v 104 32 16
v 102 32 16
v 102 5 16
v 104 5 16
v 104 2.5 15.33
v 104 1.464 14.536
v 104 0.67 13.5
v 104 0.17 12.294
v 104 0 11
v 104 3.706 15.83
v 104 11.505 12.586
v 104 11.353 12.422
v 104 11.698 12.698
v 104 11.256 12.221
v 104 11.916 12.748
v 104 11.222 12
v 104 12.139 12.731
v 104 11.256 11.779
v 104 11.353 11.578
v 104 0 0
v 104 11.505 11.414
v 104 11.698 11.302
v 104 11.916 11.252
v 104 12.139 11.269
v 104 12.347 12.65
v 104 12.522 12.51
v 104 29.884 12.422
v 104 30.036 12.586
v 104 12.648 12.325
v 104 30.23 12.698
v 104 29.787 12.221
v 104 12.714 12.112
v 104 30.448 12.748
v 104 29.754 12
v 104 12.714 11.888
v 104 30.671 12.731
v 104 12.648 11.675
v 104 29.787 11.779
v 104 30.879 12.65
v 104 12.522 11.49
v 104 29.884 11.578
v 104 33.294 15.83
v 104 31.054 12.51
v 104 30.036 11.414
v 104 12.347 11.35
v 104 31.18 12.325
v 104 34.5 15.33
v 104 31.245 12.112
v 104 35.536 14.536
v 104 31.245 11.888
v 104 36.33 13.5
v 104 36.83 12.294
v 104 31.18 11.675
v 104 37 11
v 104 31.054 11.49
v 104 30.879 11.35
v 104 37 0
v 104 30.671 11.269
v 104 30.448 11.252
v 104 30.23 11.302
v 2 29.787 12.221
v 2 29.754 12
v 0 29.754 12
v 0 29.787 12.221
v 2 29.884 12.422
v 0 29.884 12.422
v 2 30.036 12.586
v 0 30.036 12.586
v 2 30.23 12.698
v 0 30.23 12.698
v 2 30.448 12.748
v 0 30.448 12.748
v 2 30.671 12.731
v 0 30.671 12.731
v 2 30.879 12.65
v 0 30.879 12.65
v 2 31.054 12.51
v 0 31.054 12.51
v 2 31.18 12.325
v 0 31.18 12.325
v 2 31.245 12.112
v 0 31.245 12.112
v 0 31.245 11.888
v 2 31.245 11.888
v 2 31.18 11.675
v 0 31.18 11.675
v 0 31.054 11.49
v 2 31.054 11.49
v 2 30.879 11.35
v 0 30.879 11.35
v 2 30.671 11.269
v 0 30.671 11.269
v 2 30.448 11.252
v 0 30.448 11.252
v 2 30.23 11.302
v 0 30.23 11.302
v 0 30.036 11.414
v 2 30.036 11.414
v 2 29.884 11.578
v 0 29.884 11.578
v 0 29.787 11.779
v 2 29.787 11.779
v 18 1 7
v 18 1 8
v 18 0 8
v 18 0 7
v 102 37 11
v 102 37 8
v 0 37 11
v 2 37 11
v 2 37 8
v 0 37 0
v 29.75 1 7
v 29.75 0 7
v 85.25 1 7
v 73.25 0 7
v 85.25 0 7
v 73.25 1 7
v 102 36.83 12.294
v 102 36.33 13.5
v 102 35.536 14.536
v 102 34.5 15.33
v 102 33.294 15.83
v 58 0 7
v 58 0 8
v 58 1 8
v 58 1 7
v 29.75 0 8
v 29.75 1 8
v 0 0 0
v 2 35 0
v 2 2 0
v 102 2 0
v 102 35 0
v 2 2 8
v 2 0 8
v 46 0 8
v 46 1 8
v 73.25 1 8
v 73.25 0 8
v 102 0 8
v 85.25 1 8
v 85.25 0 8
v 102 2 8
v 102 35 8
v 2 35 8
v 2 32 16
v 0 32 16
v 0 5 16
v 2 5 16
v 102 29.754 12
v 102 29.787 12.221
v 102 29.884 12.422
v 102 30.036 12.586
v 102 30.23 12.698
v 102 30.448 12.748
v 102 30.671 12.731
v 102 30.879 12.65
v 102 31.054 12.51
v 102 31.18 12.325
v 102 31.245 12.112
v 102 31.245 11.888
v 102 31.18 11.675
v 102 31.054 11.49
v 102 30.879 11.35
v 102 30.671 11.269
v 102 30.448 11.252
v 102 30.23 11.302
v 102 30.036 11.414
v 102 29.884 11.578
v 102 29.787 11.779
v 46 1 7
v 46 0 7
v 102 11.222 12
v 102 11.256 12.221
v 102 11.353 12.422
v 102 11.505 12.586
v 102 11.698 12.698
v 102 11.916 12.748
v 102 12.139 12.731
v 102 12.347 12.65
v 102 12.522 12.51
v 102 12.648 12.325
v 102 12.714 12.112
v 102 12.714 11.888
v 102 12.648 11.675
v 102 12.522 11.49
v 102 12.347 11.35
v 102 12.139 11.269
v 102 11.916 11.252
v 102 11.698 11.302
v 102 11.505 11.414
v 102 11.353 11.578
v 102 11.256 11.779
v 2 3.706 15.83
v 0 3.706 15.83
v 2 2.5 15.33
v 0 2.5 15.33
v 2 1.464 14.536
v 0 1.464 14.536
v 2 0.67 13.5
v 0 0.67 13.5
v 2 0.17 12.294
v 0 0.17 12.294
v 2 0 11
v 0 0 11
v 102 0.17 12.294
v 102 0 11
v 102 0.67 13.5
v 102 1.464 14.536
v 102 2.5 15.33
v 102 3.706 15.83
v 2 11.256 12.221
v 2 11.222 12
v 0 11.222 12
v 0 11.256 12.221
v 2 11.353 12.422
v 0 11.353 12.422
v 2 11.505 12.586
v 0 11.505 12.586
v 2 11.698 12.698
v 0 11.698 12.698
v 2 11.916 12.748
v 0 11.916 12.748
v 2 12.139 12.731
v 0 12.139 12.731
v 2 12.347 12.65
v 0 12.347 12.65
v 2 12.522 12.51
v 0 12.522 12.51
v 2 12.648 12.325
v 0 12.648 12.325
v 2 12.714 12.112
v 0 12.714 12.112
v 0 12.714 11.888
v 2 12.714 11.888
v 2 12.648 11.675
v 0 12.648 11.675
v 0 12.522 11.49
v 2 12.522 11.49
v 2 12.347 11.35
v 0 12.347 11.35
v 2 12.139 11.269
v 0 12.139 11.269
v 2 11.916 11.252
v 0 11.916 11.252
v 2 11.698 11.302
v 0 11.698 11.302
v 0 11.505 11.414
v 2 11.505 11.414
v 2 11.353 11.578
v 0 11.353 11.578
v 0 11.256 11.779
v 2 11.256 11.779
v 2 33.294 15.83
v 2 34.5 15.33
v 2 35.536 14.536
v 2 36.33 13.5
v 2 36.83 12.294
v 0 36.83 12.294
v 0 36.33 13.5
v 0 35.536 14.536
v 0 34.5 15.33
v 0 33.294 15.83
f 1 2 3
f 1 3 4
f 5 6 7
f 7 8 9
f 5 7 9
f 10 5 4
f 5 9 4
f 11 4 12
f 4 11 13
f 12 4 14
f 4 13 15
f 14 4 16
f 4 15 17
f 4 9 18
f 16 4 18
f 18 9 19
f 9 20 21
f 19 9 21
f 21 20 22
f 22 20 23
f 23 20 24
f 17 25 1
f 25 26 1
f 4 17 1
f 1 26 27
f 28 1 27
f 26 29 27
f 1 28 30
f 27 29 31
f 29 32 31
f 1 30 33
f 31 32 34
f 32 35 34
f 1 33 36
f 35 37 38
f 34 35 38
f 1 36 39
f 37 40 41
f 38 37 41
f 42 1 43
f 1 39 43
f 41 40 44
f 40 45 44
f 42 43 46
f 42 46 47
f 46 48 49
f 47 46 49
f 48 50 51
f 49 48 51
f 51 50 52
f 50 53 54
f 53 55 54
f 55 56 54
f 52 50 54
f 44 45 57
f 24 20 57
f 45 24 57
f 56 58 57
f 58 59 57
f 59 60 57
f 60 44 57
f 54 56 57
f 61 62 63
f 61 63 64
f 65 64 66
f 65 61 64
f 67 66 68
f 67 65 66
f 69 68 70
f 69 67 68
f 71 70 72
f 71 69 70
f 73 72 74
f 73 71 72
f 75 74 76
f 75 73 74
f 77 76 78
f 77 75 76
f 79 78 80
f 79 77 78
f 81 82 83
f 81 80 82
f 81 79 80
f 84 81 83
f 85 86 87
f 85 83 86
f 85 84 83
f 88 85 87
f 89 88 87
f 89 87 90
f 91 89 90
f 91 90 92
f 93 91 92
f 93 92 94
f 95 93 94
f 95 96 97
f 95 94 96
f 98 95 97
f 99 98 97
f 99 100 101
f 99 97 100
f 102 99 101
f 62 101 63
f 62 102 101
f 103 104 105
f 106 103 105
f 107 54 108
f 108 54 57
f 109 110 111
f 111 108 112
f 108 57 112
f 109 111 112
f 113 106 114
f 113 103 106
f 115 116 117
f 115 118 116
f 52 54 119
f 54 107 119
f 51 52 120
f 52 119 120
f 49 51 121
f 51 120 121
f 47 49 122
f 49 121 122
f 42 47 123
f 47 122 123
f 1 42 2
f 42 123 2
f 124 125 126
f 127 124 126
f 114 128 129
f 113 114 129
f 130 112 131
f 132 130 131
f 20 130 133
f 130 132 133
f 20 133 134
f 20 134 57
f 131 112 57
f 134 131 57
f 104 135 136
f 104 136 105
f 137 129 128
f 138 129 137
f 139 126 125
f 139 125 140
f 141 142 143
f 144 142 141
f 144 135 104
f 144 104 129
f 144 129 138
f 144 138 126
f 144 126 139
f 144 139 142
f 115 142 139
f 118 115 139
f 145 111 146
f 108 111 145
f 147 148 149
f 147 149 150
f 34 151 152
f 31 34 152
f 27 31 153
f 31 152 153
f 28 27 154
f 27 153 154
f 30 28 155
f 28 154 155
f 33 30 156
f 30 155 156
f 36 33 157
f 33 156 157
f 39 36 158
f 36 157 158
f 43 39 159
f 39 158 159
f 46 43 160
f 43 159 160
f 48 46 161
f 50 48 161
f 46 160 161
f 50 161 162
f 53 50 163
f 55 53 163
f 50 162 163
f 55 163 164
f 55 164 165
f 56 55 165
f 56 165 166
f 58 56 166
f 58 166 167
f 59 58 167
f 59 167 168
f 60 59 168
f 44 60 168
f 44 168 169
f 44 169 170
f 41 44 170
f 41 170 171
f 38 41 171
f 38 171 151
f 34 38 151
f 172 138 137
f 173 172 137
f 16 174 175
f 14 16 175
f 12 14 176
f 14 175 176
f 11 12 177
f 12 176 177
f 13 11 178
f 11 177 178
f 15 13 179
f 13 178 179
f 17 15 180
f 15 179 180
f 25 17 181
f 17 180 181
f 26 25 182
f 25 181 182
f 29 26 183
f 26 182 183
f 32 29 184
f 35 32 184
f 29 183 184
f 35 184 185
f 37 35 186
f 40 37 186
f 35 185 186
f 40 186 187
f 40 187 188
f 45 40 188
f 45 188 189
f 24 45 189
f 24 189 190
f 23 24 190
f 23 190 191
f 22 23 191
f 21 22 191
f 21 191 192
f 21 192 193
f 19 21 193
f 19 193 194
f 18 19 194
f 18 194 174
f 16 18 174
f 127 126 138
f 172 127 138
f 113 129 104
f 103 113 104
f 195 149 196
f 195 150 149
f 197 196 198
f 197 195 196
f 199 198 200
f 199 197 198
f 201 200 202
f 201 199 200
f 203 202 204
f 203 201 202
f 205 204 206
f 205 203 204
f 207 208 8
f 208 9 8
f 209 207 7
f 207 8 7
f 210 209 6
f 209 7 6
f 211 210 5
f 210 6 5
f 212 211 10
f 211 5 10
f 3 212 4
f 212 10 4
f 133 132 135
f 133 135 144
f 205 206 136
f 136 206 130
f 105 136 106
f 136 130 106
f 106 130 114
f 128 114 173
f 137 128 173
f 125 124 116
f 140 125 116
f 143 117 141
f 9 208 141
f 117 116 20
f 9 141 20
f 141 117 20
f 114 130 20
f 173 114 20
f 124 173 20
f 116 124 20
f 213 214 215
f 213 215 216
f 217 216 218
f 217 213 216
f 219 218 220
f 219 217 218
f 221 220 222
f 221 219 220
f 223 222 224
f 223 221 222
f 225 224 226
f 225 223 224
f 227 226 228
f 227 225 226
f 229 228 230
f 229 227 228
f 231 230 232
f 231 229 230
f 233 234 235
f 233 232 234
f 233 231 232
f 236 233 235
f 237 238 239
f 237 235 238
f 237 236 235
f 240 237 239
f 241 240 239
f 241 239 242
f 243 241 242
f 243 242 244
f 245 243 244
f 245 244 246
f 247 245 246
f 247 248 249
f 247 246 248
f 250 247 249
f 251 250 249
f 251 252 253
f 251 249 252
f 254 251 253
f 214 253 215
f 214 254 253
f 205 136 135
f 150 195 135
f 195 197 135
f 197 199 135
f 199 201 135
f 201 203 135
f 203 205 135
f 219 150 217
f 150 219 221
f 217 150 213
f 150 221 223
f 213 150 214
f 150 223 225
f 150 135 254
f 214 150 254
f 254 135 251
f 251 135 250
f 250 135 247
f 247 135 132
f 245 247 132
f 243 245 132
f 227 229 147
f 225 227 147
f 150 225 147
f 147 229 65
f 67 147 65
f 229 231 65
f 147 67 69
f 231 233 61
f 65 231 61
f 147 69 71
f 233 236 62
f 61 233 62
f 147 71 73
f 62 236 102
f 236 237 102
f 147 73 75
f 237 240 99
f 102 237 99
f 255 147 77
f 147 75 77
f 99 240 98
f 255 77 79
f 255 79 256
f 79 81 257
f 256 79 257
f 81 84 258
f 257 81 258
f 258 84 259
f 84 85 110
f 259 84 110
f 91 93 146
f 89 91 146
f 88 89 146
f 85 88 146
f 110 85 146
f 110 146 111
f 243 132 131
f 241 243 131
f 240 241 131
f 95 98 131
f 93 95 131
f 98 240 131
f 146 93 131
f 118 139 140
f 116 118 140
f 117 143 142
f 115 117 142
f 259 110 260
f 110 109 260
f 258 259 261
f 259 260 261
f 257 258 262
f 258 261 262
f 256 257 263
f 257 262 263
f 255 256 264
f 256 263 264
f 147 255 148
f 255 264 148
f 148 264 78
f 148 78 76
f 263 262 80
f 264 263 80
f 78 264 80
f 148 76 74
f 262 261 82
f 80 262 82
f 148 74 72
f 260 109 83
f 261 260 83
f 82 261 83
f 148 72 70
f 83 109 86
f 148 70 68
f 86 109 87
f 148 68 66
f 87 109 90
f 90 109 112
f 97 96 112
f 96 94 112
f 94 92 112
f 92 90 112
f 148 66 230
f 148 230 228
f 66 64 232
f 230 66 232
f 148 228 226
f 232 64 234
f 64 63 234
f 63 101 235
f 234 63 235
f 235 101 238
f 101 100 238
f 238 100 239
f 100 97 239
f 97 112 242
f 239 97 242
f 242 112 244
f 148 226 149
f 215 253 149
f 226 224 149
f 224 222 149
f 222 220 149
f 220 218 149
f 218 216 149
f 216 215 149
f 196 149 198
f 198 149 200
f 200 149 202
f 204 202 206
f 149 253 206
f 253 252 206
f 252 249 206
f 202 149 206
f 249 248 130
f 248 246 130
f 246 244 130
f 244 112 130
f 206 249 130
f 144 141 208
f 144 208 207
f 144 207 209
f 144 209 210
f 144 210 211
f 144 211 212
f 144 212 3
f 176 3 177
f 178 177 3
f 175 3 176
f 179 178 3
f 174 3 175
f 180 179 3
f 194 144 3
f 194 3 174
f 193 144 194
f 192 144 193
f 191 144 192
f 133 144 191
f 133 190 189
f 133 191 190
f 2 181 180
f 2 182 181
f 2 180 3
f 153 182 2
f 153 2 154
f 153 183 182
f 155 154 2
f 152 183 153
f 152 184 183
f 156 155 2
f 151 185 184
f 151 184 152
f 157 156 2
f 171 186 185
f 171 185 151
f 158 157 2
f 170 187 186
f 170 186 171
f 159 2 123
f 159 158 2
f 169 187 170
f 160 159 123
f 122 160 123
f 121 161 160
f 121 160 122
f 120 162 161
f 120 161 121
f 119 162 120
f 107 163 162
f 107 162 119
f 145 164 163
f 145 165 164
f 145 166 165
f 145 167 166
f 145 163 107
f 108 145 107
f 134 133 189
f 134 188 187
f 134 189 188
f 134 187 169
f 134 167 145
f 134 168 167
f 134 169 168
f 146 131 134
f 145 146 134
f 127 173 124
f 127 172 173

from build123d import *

# Parameters (mm, degrees)
F0_W          = 104
F0_H          = 37
F0_W_2        = 100
F0_H_2        = 33
F1_DEPTH      = 8
F3_DEPTH      = 1
F5_DEPTH      = 8
F6_R          = 0.75
F7_DEPTH      = 10.7
F7_DEPTH_BACK = 110.5
F8_R          = 5


with BuildPart() as f1:
    # F0 (on Top) → F1 (new body)
    with BuildSketch(Plane.XY):
        with Locations((52, 18.5)):
            Rectangle(F0_W, F0_H)
        with Locations((52, 18.5)):
            Rectangle(F0_W_2, F0_H_2, mode=Mode.SUBTRACT)
    extrude(amount=F1_DEPTH)

    # F2 (on face) → F3 (cut)
    with BuildSketch(Plane.XY.offset(8)):
        Polygon((46, 0), (52, 0), (58, 0), (58, 1), (52, 1), (46, 1), align=None)
        Polygon((18, 0), (24, 0), (29.75, 0), (29.75, 1), (23.75, 1), (18, 1), align=None)
        Polygon((73.25, 0), (80, 0), (85.25, 0), (85.25, 1), (79.25, 1), (73.25, 1), align=None)
    extrude(amount=-F3_DEPTH, mode=Mode.SUBTRACT)

    # F4 (on face) → F5 (join)
    with BuildSketch(Plane.XY.offset(8)):
        Polygon((0, 37), (0, 0), (2, 0), (2, 2), (2, 35), (2, 37), align=None)
        Polygon((104, 37), (102, 37), (102, 35), (102, 2), (102, 0), (104, 0), align=None)
    extrude(amount=F5_DEPTH)

    # F6 (on face) → F7 (cut, two sides)
    with BuildSketch(Plane(origin=(102, 0, 0), x_dir=(0, -1, 0), z_dir=(-1, 0, 0))) as f7_sk:
        with Locations((-30.5038709193, 12)):
            Circle(F6_R)
        with Locations((-11.9723072276, 12)):
            Circle(F6_R)
    extrude(amount=-F7_DEPTH, mode=Mode.SUBTRACT)
    extrude(f7_sk.sketch, amount=F7_DEPTH_BACK, mode=Mode.SUBTRACT)

    # F8
    f8_edges = [f1.edges().sort_by_distance(p)[0] for p in [
        (1, 0, 16),
        (103, 0, 16),
        (103, 37, 16),
        (1, 37, 16),
    ]]
    fillet(f8_edges, radius=F8_R)


solid = f1.part
